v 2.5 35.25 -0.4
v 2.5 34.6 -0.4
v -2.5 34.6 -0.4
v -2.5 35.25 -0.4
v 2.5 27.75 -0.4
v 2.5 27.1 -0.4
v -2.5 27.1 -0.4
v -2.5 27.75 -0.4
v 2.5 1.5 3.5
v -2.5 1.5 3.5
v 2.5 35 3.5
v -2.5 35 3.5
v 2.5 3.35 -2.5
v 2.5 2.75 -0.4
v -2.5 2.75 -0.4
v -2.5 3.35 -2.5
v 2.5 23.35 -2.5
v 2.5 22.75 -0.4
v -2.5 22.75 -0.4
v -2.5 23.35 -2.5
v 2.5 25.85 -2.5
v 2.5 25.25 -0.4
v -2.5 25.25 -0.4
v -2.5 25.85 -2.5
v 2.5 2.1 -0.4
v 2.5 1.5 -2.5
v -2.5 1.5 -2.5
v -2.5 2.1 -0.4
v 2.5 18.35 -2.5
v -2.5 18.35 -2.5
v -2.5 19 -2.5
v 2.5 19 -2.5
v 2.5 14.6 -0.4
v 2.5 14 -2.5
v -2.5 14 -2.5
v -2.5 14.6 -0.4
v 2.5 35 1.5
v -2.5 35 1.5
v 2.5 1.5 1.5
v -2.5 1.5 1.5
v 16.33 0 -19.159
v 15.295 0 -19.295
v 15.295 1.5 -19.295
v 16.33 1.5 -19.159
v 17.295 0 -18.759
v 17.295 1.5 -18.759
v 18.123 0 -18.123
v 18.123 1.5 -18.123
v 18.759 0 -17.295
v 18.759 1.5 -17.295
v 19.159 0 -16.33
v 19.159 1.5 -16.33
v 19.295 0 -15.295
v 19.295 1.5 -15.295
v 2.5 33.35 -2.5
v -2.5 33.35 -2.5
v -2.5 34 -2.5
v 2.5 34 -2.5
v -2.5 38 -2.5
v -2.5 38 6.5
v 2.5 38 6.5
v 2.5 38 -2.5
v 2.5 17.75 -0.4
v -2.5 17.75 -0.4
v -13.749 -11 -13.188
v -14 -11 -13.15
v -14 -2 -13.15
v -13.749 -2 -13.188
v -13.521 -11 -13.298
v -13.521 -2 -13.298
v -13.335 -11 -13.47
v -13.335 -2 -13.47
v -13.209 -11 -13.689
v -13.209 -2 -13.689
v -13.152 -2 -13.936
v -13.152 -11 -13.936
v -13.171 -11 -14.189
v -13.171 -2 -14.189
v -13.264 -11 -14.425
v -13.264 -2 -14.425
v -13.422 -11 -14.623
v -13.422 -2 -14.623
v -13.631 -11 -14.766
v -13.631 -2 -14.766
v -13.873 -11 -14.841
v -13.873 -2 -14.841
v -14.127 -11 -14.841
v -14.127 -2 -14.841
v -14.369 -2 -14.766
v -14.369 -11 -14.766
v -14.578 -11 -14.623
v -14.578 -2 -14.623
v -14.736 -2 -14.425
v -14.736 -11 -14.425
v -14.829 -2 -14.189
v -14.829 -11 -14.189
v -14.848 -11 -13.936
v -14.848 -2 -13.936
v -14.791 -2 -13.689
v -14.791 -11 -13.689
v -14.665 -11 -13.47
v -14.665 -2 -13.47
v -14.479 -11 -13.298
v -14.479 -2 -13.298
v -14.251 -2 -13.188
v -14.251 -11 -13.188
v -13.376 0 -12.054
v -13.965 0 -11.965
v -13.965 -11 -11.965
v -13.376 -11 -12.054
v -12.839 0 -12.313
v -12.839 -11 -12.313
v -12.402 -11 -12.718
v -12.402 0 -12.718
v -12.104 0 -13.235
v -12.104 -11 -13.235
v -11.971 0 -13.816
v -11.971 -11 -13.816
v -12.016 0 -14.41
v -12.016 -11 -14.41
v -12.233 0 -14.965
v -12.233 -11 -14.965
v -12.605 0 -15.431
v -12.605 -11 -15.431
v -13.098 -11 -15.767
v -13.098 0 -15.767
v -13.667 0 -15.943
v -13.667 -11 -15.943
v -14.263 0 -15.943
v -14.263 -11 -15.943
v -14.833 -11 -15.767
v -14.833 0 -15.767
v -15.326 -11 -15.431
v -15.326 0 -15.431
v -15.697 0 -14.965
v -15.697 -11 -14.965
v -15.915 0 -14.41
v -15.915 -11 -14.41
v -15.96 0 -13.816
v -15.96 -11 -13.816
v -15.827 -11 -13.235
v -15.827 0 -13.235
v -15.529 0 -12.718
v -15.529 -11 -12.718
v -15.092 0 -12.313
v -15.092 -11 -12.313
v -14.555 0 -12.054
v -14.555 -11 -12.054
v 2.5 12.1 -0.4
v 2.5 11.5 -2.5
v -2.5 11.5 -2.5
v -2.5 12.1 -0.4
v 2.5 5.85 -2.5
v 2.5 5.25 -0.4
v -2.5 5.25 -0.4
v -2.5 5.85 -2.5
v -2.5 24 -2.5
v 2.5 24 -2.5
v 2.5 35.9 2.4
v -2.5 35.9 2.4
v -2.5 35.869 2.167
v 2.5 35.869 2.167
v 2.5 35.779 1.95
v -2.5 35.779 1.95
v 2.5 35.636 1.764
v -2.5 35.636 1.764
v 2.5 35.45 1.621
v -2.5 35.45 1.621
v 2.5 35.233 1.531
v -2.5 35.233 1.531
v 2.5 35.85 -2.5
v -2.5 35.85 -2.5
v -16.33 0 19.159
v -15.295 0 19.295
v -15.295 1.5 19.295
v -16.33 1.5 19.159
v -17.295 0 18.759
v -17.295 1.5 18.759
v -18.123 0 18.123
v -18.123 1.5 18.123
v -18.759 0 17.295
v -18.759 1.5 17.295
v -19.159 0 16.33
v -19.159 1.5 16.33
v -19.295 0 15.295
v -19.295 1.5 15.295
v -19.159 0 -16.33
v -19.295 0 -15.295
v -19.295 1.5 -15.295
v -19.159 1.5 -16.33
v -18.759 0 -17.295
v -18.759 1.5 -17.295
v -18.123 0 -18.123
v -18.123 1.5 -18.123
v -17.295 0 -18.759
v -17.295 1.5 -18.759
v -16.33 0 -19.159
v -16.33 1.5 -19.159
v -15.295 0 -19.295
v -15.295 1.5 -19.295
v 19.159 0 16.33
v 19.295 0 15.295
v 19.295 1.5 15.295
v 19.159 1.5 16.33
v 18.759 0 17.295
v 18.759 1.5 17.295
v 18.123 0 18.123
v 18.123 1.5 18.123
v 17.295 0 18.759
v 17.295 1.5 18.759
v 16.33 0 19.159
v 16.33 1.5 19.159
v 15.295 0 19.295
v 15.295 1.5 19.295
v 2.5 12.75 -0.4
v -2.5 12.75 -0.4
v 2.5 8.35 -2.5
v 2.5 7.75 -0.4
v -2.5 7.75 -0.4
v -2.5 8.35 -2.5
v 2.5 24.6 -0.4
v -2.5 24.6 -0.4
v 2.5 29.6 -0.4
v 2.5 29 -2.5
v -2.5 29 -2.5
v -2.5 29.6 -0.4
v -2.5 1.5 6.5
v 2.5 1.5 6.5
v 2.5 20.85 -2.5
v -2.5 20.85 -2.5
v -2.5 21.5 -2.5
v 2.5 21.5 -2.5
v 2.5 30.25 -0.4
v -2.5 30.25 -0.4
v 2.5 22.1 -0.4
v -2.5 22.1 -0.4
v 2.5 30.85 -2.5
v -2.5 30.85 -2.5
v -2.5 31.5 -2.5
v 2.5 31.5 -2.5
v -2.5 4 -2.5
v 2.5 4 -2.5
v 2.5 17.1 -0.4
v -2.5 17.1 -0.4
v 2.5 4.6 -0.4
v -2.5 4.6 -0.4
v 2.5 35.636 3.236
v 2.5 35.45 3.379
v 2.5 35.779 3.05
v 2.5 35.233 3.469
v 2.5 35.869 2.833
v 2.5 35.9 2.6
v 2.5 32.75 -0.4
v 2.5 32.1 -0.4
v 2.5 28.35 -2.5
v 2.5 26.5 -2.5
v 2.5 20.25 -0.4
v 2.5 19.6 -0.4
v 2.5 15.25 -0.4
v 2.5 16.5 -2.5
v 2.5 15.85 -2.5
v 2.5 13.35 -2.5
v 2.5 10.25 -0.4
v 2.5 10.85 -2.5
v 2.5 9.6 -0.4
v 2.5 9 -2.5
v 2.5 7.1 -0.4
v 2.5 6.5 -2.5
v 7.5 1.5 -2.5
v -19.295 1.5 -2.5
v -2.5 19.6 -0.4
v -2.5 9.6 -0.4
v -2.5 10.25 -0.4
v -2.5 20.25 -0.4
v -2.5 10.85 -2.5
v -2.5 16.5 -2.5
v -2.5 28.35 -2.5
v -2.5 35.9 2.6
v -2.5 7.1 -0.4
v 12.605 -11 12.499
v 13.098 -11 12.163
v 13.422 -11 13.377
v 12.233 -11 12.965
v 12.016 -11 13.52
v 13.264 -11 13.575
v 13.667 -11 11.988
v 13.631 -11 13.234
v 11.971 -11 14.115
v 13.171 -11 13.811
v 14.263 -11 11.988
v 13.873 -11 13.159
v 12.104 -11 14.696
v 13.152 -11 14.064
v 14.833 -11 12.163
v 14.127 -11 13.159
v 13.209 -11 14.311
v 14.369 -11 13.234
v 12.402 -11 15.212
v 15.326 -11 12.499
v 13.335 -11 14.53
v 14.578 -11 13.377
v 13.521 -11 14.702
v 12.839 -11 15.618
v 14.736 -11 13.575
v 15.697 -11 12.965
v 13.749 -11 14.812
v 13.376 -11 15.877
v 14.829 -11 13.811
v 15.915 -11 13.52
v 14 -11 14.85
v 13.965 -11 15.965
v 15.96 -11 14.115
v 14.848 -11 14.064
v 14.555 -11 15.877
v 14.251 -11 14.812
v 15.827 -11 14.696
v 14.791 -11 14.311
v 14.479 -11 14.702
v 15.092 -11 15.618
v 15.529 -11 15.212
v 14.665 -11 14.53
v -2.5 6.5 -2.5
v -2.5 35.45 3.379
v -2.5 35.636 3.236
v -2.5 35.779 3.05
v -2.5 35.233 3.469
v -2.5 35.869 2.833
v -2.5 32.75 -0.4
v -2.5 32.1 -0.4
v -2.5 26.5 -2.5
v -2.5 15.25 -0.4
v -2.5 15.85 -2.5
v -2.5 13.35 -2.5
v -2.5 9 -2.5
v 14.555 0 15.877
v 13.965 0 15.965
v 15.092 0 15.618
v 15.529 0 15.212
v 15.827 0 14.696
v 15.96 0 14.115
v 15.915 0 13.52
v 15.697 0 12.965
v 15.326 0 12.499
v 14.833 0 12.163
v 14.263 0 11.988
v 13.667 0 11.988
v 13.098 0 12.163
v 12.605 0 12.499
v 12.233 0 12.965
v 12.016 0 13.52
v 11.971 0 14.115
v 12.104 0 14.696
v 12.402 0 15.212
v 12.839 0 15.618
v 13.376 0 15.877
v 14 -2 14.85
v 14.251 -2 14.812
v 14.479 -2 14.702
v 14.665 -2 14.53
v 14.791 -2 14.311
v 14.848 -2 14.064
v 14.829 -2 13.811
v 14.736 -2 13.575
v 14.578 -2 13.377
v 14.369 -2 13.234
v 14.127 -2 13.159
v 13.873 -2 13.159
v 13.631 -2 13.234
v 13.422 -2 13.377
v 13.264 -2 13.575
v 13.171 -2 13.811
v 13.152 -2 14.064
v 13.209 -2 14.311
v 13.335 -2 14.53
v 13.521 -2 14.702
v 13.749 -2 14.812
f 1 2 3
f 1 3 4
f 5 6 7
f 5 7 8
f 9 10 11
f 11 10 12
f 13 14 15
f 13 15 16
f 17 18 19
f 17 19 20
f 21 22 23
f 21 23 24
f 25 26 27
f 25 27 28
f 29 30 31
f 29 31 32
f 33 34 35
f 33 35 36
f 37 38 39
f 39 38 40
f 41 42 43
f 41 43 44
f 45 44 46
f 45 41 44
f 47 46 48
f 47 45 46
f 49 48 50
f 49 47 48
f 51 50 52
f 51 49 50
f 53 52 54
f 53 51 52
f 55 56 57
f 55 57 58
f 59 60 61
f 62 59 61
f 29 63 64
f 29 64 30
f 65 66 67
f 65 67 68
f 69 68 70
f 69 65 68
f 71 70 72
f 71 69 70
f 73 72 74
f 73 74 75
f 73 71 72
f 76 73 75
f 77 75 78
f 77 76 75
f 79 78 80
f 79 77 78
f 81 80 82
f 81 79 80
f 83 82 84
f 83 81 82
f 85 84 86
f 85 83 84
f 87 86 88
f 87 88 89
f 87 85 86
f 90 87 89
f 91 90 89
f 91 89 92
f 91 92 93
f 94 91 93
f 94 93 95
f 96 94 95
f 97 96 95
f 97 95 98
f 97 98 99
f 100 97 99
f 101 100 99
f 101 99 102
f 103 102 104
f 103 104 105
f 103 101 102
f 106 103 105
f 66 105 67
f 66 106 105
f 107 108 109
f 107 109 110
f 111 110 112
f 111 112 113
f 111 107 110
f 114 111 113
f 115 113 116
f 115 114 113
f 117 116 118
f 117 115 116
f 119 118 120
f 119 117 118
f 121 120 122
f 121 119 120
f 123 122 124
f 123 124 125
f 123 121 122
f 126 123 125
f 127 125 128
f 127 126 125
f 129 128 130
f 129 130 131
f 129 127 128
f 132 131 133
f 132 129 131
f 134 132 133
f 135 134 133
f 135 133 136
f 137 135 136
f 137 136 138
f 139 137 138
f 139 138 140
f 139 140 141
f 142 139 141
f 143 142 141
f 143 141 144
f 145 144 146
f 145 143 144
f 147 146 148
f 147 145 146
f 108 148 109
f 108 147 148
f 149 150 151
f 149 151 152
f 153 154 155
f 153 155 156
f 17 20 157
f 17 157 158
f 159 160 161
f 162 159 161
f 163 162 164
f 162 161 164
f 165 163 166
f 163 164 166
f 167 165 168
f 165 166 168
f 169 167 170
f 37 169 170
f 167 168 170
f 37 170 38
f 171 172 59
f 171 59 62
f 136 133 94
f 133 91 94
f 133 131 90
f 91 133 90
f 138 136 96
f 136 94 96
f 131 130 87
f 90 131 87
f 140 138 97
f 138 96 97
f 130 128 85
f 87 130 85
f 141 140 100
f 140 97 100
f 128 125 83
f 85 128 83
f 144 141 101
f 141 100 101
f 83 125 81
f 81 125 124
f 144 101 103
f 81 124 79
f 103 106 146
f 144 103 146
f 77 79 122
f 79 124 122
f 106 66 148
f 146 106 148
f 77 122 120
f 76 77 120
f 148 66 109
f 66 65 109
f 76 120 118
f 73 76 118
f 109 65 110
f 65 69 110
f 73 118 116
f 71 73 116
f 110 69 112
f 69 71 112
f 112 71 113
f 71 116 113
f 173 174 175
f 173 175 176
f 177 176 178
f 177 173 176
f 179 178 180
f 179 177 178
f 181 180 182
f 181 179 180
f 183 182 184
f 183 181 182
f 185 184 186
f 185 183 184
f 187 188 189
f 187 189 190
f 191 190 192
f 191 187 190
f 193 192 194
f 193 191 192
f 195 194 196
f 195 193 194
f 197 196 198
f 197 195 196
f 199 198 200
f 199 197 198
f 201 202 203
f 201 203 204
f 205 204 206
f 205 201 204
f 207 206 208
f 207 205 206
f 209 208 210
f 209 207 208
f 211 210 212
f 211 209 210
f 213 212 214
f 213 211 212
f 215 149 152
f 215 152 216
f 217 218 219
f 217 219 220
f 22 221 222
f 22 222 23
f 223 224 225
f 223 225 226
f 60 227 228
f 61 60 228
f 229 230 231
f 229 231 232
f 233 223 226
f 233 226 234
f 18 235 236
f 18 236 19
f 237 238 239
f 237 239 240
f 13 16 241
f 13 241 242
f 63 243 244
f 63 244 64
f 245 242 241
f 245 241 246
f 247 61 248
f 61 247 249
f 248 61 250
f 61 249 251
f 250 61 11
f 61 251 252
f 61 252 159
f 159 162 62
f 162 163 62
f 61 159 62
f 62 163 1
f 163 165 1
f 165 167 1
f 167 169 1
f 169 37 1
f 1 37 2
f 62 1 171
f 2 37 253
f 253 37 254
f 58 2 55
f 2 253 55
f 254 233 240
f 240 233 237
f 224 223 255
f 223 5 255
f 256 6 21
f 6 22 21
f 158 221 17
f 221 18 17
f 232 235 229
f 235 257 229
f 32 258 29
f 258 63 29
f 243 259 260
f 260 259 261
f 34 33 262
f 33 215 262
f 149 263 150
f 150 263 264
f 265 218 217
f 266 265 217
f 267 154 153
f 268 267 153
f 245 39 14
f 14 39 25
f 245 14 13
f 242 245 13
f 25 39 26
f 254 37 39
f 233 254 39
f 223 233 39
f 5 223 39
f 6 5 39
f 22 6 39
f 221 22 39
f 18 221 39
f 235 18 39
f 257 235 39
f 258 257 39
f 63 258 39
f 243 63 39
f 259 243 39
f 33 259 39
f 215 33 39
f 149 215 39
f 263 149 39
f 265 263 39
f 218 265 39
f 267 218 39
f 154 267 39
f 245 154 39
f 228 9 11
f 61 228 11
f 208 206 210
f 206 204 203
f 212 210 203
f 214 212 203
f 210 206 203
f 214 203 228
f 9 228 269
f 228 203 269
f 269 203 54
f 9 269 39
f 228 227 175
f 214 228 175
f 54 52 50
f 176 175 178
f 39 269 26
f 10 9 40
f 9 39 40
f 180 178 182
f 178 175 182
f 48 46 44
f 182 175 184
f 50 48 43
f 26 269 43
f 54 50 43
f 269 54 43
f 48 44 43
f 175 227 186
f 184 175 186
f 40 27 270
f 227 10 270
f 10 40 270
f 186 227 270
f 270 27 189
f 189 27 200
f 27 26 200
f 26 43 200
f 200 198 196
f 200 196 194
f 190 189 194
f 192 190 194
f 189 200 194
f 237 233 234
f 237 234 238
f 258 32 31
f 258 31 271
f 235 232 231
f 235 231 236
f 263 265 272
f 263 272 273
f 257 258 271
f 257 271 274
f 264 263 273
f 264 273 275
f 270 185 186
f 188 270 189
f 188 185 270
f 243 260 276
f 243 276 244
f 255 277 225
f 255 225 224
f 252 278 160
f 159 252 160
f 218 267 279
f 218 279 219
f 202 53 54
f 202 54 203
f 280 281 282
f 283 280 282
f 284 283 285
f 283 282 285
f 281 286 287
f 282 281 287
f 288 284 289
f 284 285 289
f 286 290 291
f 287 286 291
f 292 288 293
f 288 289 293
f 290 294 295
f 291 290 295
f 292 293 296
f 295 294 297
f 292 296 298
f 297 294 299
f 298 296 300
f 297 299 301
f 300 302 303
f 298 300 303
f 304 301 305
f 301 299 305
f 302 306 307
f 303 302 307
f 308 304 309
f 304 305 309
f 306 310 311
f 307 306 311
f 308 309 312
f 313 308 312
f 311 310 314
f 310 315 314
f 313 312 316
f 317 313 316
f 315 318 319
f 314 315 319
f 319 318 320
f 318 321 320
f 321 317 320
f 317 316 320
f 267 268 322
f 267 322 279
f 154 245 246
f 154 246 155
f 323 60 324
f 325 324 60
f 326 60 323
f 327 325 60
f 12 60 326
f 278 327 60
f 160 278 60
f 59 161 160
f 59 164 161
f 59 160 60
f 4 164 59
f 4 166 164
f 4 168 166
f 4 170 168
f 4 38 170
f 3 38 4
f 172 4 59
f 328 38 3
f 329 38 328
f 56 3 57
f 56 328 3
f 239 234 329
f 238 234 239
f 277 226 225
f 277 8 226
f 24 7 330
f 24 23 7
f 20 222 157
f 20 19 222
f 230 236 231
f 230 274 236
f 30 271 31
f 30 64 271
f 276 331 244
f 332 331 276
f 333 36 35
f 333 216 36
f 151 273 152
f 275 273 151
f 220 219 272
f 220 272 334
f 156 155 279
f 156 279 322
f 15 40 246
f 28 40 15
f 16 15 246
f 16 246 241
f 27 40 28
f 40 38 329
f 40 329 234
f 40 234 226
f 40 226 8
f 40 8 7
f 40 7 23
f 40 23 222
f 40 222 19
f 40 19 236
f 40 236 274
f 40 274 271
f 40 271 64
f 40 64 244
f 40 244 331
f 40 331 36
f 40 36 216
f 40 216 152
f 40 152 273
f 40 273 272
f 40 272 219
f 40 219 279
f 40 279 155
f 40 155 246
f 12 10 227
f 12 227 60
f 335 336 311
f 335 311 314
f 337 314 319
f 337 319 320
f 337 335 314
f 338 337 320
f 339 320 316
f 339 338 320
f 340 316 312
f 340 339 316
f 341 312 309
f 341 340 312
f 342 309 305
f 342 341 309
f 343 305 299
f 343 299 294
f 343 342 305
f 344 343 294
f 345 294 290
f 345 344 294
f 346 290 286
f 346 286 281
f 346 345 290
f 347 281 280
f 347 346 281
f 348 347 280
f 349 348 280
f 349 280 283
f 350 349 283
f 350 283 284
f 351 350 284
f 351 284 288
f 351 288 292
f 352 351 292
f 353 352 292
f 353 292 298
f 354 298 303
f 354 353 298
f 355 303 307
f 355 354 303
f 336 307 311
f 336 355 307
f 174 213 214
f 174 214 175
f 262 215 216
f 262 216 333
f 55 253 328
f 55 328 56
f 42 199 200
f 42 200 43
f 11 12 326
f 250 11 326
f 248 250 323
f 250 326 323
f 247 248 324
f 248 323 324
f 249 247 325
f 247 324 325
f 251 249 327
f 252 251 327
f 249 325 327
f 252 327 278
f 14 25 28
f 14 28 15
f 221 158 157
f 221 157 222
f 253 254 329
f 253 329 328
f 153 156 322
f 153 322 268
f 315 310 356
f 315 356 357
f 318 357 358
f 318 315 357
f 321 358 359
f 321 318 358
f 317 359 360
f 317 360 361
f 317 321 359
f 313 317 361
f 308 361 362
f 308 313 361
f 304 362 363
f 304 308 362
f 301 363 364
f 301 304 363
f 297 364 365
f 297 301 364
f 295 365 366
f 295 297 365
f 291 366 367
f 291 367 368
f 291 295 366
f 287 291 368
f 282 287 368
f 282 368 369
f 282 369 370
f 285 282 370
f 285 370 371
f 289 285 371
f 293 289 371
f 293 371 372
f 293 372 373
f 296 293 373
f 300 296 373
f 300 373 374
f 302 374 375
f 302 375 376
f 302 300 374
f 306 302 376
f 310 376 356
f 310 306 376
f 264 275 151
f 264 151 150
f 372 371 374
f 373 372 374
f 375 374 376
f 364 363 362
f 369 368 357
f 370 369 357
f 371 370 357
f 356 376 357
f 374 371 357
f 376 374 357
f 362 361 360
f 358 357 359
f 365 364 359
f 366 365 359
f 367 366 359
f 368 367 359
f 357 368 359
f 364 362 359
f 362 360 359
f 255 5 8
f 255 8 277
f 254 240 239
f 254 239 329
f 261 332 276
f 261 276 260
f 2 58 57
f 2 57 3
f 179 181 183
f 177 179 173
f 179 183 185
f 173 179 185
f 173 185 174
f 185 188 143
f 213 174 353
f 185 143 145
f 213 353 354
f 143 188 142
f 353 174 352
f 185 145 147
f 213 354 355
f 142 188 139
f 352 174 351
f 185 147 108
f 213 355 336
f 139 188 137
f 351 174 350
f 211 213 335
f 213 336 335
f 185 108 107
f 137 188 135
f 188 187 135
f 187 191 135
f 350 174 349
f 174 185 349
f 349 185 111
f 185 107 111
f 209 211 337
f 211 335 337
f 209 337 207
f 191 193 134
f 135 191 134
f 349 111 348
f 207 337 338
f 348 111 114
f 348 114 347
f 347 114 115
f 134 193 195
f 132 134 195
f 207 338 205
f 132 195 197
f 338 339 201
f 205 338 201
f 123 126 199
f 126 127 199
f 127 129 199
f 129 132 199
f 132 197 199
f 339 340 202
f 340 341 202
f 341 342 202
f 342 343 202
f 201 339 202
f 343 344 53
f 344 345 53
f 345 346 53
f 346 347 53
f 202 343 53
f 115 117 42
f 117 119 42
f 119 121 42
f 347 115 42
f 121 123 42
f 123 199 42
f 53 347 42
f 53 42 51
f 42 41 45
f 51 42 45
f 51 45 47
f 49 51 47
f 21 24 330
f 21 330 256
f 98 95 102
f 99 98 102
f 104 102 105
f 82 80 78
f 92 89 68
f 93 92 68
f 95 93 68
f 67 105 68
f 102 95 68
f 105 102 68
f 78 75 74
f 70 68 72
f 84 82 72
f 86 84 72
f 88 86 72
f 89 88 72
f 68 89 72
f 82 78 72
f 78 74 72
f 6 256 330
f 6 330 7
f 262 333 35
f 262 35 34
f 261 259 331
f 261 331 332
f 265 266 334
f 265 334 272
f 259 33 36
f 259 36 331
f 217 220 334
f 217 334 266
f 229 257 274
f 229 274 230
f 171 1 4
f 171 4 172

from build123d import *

# Parameters (mm, degrees)
DODANIE_WYCI_GNI_CIE1_DEPTH     = 1.5
SZKIC1_4_W                      = 5
SZKIC1_4_H                      = 9
DODANIE_WYCI_GNI_CIE2_DEPTH     = 38
SZKIC1_5_R                      = 2
DODANIE_WYCI_GNI_CIE3_DEPTH     = 11
SZKIC2_R                        = 0.85
WYTNIJ_WYCI_GNI_CIE3_DEPTH      = 9
WYTNIJ_WYCI_GNI_CIE4_DEPTH      = 48.867724512
WYTNIJ_WYCI_GNI_CIE4_DEPTH_BACK = 10
WYTNIJ_WYCI_GNI_CIE5_DEPTH      = 10


with BuildPart() as part:
    # Szkic1 → Dodanie-wyciągnięcie1 (new body)
    with BuildSketch(Plane(origin=(0, 0, 0), x_dir=(1, 0, 0), z_dir=(0, 1, 0))):
        with BuildLine():
            Line((15.295, -19.295), (-15.295, -19.295))
            ThreePointArc((-15.295, -19.295), (-18.123427125, -18.123427125), (-19.295, -15.295))
            Line((-19.295, -15.295), (-19.295, 15.295))
            ThreePointArc((-19.295, 15.295), (-18.123427125, 18.123427125), (-15.295, 19.295))
            Line((-15.295, 19.295), (15.295, 19.295))
            ThreePointArc((15.295, 19.295), (18.123427125, 18.123427125), (19.295, 15.295))
            Line((19.295, 15.295), (19.295, -15.295))
            ThreePointArc((19.295, -15.295), (18.123427125, -18.123427125), (15.295, -19.295))
        make_face()
    extrude(amount=DODANIE_WYCI_GNI_CIE1_DEPTH)

    # Szkic1<4> → Dodanie-wyciągnięcie2 (add)
    with BuildSketch(Plane(origin=(0, 0, 0), x_dir=(1, 0, 0), z_dir=(0, 1, 0))):
        with Locations((0, -2)):
            Rectangle(SZKIC1_4_W, SZKIC1_4_H)
    extrude(amount=DODANIE_WYCI_GNI_CIE2_DEPTH)

    # Szkic1<5> → Dodanie-wyciągnięcie3 (add)
    with BuildSketch(Plane(origin=(0, 0, 0), x_dir=(1, 0, 0), z_dir=(0, 1, 0))):
        with Locations(Location((13.965358928, -13.965358928, 0), (0, 0, 270))):
            Circle(SZKIC1_5_R)
        with Locations(Location((-13.965358928, 13.965358928, 0), (0, 0, 270))):
            Circle(SZKIC1_5_R)
    extrude(amount=-DODANIE_WYCI_GNI_CIE3_DEPTH)

    # Szkic2 → Wytnij-wyciągnięcie3 (cut)
    with BuildSketch(Plane(origin=(0, -11, 0), x_dir=(1, 0, 0), z_dir=(0, 1, 0))):
        with Locations(Location((-14, 14, 0), (0, 0, 270))):
            Circle(SZKIC2_R)
        with Locations(Location((14, -14, 0), (0, 0, 270))):
            Circle(SZKIC2_R)
    extrude(amount=WYTNIJ_WYCI_GNI_CIE3_DEPTH, mode=Mode.SUBTRACT)

    # Szkic4 → Wytnij-wyciągnięcie4 (cut, two sides: drawn at the far end of the back side and taken through both)
    with BuildSketch(Plane.ZY.offset(2.5).offset(-WYTNIJ_WYCI_GNI_CIE4_DEPTH_BACK)):
        Polygon((-2.5, 5.85), (-2.5, 4), (-0.4, 4.6), (-0.4, 5.25), align=None)
        Polygon((-0.4, 2.75), (-2.5, 3.35), (-2.5, 1.5), (-0.4, 2.1), align=None)
        Polygon((-2.5, 8.35), (-2.5, 6.5), (-0.4, 7.1), (-0.4, 7.75), align=None)
        Polygon((-2.5, 10.85), (-2.5, 9), (-0.4, 9.6), (-0.4, 10.25), align=None)
        Polygon((-2.5, 13.35), (-2.5, 11.5), (-0.4, 12.1), (-0.4, 12.75), align=None)
        Polygon((-2.5, 15.85), (-2.5, 14), (-0.4, 14.6), (-0.4, 15.25), align=None)
        Polygon((-0.4, 35.25), (-2.5, 35.85), (-2.5, 34), (-0.4, 34.6), align=None)
        Polygon((-2.5, 18.35), (-2.5, 16.5), (-0.4, 17.1), (-0.4, 17.75), align=None)
        Polygon((-0.4, 32.75), (-2.5, 33.35), (-2.5, 31.5), (-0.4, 32.1), align=None)
        Polygon((-2.5, 20.85), (-2.5, 19), (-0.4, 19.6), (-0.4, 20.25), align=None)
        Polygon((-0.4, 30.25), (-2.5, 30.85), (-2.5, 29), (-0.4, 29.6), align=None)
        Polygon((-2.5, 23.35), (-2.5, 21.5), (-0.4, 22.1), (-0.4, 22.75), align=None)
        Polygon((-0.4, 27.75), (-2.5, 28.35), (-2.5, 26.5), (-0.4, 27.1), align=None)
        Polygon((-2.5, 25.85), (-2.5, 24), (-0.4, 24.6), (-0.4, 25.25), align=None)
    extrude(amount=WYTNIJ_WYCI_GNI_CIE4_DEPTH + WYTNIJ_WYCI_GNI_CIE4_DEPTH_BACK, mode=Mode.SUBTRACT)

    # Szkic4<4> → Wytnij-wyciągnięcie5 (cut)
    with BuildSketch(Plane.ZY.offset(2.5)):
        with BuildLine():
            ThreePointArc((3.5, 35), (3.236396103, 35.636396103), (2.6, 35.9))
            Line((2.6, 35.9), (2.4, 35.9))
            ThreePointArc((2.4, 35.9), (1.763603897, 35.636396103), (1.5, 35))
            Line((1.5, 35), (1.5, 1.5))
            Line((1.5, 1.5), (3.5, 1.5))
            Line((3.5, 1.5), (3.5, 35))
        make_face()
    extrude(amount=-WYTNIJ_WYCI_GNI_CIE5_DEPTH, mode=Mode.SUBTRACT)


solid = part.part
